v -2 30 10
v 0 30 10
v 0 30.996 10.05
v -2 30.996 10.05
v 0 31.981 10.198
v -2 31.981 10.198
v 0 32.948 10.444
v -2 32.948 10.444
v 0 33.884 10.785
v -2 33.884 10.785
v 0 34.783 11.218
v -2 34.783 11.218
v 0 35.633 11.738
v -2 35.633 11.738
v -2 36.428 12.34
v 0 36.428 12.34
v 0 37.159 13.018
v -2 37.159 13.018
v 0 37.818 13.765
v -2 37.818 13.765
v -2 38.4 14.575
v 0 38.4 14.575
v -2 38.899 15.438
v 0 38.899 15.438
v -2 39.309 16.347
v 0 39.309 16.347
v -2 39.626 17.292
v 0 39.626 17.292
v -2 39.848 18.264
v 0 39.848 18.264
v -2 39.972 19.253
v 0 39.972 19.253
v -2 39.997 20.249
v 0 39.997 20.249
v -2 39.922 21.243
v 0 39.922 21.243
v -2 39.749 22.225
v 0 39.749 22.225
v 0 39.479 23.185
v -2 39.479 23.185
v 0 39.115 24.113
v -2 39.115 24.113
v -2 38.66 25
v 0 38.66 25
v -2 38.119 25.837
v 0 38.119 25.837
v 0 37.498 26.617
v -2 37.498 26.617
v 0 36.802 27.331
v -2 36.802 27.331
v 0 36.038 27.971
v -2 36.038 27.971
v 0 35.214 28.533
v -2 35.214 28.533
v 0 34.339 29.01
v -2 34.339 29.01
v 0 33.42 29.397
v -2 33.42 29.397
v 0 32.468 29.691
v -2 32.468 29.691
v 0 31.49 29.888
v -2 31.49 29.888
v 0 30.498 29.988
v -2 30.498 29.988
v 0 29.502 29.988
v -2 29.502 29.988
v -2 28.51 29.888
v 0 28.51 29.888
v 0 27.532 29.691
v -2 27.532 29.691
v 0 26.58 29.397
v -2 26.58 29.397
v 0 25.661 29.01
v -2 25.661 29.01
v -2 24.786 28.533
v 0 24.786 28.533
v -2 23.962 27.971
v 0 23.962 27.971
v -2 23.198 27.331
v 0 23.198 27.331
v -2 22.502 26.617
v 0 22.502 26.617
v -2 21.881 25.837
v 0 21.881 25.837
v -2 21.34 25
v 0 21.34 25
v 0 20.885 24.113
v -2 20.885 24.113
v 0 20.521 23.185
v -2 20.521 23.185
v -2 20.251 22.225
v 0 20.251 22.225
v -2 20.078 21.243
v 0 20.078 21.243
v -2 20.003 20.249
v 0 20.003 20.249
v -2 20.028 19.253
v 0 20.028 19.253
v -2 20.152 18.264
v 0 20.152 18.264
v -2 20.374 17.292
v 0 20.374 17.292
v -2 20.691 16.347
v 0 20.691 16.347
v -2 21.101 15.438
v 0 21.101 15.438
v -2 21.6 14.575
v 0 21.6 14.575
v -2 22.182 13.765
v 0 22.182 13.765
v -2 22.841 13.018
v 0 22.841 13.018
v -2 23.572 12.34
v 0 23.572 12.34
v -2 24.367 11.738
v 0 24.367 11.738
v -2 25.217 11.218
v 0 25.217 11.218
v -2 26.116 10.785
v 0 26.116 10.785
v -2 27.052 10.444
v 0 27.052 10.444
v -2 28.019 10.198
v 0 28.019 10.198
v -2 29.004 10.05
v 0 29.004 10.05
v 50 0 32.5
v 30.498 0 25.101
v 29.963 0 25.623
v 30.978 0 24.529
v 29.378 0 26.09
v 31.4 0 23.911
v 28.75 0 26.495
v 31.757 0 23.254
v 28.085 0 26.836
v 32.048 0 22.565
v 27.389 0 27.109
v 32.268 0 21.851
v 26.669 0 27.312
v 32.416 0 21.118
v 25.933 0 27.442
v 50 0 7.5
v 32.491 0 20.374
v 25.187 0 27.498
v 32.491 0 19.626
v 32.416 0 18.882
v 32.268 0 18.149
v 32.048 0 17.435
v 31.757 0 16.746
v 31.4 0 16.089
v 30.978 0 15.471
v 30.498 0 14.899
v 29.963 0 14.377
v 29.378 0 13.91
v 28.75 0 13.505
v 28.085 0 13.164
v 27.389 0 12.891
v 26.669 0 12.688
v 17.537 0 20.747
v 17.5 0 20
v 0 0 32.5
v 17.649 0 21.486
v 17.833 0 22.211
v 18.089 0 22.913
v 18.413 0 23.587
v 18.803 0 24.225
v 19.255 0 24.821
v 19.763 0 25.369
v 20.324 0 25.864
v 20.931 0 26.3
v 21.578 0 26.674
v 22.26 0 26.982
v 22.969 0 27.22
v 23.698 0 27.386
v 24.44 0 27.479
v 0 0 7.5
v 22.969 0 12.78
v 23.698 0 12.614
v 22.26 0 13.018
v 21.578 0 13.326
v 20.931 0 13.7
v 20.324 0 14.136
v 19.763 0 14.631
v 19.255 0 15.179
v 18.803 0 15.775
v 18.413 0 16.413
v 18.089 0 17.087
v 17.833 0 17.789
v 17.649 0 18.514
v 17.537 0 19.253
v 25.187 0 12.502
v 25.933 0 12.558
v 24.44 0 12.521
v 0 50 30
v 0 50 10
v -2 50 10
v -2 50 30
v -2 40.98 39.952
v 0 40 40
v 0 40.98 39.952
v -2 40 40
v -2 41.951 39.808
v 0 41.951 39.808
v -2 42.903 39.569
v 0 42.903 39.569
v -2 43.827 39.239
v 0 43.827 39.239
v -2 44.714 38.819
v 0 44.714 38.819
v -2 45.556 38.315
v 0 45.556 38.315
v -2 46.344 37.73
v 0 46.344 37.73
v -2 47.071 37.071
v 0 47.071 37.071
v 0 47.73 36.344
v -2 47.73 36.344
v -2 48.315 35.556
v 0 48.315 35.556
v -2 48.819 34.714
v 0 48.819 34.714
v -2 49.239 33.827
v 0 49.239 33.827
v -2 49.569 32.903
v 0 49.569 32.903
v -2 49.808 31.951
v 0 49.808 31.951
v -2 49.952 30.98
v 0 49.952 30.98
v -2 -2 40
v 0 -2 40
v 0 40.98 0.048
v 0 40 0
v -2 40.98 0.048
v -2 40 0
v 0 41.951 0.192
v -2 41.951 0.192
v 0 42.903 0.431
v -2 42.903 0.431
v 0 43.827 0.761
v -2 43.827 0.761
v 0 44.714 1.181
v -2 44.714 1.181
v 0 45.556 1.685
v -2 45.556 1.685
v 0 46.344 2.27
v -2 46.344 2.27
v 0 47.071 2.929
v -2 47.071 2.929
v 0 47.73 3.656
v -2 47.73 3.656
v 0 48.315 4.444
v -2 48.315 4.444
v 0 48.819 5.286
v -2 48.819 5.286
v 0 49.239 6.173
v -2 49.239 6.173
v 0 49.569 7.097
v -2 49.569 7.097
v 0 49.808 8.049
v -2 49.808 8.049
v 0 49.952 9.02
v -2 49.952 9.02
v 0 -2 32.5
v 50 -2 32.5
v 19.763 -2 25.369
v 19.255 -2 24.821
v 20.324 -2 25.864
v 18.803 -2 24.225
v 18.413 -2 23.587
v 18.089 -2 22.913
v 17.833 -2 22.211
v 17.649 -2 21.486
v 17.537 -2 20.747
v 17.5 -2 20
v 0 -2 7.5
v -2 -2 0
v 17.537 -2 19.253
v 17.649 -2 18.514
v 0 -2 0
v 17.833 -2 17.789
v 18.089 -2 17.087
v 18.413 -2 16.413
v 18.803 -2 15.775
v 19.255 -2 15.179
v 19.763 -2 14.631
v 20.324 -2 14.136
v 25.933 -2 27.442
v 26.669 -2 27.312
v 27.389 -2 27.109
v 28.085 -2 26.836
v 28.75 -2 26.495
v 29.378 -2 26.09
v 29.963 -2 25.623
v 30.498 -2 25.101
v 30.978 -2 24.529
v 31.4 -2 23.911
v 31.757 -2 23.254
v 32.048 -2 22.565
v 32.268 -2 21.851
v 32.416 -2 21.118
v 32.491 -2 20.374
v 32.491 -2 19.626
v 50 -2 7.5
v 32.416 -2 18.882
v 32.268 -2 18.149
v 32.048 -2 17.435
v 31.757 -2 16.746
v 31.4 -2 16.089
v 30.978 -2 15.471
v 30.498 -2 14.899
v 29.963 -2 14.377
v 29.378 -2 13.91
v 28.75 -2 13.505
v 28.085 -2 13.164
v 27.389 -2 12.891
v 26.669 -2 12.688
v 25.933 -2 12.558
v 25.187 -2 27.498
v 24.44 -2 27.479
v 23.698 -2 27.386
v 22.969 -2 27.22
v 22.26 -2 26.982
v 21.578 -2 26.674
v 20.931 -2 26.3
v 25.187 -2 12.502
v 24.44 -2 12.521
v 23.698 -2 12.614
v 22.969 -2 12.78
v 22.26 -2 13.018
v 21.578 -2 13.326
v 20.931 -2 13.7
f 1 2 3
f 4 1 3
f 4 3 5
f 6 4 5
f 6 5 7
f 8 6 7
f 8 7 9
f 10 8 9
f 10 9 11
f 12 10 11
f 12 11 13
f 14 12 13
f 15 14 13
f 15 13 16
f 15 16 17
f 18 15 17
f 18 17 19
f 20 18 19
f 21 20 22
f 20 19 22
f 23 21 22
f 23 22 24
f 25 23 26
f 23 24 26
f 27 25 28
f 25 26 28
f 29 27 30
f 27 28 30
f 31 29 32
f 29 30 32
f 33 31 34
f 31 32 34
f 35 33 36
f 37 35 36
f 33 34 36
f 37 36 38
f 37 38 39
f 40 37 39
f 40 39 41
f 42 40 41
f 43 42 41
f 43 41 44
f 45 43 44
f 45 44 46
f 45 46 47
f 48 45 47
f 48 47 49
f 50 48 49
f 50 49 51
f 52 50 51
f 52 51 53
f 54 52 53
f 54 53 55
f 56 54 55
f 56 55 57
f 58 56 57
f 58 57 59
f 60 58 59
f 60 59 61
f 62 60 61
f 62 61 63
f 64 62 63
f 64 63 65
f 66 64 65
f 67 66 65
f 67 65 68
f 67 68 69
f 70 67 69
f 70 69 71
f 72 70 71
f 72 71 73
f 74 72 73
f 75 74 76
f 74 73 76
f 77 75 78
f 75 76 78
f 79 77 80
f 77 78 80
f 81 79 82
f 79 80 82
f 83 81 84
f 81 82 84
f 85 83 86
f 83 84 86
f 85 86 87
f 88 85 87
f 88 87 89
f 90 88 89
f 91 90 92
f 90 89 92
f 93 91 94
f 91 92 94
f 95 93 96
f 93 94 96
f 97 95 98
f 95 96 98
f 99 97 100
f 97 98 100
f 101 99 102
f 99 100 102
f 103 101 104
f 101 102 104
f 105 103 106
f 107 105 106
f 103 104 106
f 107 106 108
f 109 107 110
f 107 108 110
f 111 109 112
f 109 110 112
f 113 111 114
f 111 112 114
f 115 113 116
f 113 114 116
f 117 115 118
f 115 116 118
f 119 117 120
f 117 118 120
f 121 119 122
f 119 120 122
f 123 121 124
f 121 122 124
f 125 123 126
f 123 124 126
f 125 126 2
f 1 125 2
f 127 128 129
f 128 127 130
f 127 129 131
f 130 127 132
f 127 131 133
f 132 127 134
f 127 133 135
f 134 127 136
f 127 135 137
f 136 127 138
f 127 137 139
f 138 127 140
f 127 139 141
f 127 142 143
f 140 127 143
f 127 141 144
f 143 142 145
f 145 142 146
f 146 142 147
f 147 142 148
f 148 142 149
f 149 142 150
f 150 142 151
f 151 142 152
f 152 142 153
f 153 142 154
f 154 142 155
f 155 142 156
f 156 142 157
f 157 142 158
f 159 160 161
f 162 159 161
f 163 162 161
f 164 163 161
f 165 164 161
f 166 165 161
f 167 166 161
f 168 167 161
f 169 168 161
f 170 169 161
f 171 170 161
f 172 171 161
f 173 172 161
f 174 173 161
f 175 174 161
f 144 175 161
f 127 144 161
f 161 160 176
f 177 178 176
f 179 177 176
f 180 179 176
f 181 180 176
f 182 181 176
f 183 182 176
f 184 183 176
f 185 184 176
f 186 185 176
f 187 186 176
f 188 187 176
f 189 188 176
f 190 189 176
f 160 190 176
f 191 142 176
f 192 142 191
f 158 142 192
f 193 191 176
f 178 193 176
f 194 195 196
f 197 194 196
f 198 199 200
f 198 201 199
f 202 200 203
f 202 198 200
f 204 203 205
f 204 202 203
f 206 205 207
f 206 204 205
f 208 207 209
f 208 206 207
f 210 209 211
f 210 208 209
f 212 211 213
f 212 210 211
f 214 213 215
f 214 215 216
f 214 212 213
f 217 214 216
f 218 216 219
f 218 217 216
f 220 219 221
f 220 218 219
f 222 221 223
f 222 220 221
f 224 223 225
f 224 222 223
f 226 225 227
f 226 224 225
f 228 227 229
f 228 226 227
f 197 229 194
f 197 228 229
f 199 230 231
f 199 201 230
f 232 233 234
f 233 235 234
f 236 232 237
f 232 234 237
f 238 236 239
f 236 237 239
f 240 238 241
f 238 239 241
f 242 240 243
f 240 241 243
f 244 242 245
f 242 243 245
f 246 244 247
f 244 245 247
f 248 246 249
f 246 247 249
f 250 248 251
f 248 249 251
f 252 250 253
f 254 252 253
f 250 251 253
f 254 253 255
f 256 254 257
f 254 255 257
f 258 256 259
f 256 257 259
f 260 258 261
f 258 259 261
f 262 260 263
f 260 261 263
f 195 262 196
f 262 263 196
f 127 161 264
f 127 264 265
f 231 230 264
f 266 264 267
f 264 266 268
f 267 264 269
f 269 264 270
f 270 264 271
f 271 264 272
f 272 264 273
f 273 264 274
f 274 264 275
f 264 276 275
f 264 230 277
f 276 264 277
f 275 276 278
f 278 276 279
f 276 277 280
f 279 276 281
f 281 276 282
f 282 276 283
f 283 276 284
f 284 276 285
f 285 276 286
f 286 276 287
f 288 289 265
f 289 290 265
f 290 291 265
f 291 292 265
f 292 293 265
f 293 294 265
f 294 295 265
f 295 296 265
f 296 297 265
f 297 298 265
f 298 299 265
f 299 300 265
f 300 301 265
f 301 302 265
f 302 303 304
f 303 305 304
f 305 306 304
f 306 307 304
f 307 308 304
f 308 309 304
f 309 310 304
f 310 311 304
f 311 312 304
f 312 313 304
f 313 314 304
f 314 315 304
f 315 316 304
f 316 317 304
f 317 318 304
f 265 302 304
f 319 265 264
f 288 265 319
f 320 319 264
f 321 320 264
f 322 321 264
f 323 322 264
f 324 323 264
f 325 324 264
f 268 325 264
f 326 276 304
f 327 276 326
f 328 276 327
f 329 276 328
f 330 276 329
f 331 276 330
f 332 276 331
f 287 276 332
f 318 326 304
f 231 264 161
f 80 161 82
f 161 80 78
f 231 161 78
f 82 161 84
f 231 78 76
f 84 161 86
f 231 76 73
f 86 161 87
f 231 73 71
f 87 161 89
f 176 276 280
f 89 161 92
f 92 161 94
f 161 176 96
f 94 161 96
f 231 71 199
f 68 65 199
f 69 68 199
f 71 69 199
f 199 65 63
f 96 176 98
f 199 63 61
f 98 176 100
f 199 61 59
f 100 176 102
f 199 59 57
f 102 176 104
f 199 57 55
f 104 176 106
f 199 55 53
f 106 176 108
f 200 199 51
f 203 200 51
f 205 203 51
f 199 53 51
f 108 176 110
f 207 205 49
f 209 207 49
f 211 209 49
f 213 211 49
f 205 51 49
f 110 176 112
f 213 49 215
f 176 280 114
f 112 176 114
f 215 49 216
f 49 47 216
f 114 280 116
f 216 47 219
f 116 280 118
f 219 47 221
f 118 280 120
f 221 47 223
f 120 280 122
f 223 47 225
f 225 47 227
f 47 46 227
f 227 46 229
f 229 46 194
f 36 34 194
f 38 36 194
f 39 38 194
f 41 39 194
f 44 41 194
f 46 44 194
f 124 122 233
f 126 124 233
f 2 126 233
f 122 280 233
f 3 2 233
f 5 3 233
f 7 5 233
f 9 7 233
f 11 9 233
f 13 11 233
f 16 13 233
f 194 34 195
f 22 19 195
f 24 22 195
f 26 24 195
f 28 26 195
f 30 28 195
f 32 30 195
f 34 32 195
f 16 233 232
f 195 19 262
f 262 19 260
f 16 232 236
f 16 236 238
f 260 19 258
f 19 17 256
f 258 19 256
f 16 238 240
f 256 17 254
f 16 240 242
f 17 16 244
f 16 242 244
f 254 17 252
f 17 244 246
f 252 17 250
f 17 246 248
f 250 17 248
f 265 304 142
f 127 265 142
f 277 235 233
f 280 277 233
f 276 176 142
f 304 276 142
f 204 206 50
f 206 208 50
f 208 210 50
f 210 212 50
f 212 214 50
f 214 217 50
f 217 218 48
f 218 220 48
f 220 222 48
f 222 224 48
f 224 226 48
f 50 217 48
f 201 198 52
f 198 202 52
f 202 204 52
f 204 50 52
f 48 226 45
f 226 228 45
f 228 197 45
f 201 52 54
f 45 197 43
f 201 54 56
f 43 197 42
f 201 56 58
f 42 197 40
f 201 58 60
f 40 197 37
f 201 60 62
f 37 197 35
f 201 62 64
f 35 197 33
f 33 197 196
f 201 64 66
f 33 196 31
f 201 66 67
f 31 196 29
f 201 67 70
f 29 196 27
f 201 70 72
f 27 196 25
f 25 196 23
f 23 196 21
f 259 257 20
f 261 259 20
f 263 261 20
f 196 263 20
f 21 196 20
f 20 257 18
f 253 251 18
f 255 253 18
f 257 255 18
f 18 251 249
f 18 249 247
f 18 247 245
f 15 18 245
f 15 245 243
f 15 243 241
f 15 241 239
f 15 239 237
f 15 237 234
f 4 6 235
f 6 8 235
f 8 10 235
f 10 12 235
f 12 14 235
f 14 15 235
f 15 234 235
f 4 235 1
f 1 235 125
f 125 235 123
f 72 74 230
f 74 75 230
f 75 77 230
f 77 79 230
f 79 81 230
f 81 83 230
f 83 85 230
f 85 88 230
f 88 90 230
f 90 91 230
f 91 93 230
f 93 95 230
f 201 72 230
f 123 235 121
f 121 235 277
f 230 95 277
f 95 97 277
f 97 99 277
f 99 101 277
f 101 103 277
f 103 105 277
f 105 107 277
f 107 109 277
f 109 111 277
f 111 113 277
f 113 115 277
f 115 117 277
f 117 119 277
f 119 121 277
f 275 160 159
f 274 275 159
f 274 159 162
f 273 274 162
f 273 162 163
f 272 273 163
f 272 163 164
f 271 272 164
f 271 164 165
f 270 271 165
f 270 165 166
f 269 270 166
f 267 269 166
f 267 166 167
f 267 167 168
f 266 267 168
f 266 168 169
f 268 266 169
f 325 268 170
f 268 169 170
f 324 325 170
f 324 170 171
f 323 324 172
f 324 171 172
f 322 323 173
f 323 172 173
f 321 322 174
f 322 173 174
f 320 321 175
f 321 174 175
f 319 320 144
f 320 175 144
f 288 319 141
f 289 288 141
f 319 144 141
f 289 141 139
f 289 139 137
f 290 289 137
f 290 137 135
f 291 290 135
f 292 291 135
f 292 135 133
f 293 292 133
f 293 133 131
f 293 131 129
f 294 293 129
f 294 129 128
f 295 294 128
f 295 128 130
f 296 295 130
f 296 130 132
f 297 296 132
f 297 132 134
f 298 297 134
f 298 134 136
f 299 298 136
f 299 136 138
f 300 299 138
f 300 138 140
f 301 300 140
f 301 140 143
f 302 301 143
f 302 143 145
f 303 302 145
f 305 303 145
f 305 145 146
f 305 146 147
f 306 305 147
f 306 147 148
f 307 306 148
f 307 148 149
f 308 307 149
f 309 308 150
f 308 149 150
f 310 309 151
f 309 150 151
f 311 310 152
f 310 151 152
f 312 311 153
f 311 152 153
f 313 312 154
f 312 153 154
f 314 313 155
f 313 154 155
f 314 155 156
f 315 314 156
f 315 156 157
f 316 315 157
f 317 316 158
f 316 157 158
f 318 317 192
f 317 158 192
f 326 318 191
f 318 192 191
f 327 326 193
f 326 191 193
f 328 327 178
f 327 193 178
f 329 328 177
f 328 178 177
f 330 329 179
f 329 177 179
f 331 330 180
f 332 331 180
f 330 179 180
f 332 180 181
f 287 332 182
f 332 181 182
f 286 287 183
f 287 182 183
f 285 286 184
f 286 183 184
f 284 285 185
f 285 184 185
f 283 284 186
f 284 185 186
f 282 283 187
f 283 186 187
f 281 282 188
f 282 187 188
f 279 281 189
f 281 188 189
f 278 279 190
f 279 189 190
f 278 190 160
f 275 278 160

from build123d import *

# Parameters (mm, degrees)
RESSALTO_EXTRUS_O1_DEPTH = 40
ESBO_O2_R                = 10
CORTE_EXTRUS_O1_DEPTH    = 40
ESBO_O3_R                = 7.5
CORTE_EXTRUS_O2_DEPTH    = 40
FILETE1_R                = 10
ESBO_O4_W                = 50
ESBO_O4_H                = 7.5
CORTE_EXTRUS_O3_DEPTH    = 290


with BuildPart() as part:
    # Esboço1 → Ressalto-extrusão1 (new body)
    with BuildSketch(Plane.XY):
        Polygon((0, 0), (0, 50), (-2, 50), (-2, -2), (50, -2), (50, 0), align=None)
    extrude(amount=RESSALTO_EXTRUS_O1_DEPTH)

    # Esboço2 → Corte-extrusão1 (cut)
    with BuildSketch(Plane(origin=(0, 0, 0), x_dir=(0, 0, -1), z_dir=(1, 0, 0))):
        with Locations((-20, 30)):
            Circle(ESBO_O2_R)
    extrude(amount=-CORTE_EXTRUS_O1_DEPTH, mode=Mode.SUBTRACT)

    # Esboço3 → Corte-extrusão2 (cut)
    with BuildSketch(Plane(origin=(0, 0, 0), x_dir=(1, 0, 0), z_dir=(0, 1, 0))):
        with Locations(Location((25, -20, 0), (0, 0, 180))):
            Circle(ESBO_O3_R)
    extrude(amount=-CORTE_EXTRUS_O2_DEPTH, mode=Mode.SUBTRACT)

    # Filete1
    filete1_edges = [part.edges().sort_by_distance(p)[0] for p in [
        (-1, 50, 40),
        (-1, 50, 0),
    ]]
    fillet(filete1_edges, radius=FILETE1_R)

    # Esboço4 → Corte-extrusão3 (cut)
    with BuildSketch(Plane(origin=(0, 0, 0), x_dir=(1, 0, 0), z_dir=(0, 1, 0))):
        with Locations((25, -36.25)):
            Rectangle(ESBO_O4_W, ESBO_O4_H)
        with Locations((25, -3.75)):
            Rectangle(ESBO_O4_W, ESBO_O4_H)
    extrude(amount=-CORTE_EXTRUS_O3_DEPTH, mode=Mode.SUBTRACT)


solid = part.part
